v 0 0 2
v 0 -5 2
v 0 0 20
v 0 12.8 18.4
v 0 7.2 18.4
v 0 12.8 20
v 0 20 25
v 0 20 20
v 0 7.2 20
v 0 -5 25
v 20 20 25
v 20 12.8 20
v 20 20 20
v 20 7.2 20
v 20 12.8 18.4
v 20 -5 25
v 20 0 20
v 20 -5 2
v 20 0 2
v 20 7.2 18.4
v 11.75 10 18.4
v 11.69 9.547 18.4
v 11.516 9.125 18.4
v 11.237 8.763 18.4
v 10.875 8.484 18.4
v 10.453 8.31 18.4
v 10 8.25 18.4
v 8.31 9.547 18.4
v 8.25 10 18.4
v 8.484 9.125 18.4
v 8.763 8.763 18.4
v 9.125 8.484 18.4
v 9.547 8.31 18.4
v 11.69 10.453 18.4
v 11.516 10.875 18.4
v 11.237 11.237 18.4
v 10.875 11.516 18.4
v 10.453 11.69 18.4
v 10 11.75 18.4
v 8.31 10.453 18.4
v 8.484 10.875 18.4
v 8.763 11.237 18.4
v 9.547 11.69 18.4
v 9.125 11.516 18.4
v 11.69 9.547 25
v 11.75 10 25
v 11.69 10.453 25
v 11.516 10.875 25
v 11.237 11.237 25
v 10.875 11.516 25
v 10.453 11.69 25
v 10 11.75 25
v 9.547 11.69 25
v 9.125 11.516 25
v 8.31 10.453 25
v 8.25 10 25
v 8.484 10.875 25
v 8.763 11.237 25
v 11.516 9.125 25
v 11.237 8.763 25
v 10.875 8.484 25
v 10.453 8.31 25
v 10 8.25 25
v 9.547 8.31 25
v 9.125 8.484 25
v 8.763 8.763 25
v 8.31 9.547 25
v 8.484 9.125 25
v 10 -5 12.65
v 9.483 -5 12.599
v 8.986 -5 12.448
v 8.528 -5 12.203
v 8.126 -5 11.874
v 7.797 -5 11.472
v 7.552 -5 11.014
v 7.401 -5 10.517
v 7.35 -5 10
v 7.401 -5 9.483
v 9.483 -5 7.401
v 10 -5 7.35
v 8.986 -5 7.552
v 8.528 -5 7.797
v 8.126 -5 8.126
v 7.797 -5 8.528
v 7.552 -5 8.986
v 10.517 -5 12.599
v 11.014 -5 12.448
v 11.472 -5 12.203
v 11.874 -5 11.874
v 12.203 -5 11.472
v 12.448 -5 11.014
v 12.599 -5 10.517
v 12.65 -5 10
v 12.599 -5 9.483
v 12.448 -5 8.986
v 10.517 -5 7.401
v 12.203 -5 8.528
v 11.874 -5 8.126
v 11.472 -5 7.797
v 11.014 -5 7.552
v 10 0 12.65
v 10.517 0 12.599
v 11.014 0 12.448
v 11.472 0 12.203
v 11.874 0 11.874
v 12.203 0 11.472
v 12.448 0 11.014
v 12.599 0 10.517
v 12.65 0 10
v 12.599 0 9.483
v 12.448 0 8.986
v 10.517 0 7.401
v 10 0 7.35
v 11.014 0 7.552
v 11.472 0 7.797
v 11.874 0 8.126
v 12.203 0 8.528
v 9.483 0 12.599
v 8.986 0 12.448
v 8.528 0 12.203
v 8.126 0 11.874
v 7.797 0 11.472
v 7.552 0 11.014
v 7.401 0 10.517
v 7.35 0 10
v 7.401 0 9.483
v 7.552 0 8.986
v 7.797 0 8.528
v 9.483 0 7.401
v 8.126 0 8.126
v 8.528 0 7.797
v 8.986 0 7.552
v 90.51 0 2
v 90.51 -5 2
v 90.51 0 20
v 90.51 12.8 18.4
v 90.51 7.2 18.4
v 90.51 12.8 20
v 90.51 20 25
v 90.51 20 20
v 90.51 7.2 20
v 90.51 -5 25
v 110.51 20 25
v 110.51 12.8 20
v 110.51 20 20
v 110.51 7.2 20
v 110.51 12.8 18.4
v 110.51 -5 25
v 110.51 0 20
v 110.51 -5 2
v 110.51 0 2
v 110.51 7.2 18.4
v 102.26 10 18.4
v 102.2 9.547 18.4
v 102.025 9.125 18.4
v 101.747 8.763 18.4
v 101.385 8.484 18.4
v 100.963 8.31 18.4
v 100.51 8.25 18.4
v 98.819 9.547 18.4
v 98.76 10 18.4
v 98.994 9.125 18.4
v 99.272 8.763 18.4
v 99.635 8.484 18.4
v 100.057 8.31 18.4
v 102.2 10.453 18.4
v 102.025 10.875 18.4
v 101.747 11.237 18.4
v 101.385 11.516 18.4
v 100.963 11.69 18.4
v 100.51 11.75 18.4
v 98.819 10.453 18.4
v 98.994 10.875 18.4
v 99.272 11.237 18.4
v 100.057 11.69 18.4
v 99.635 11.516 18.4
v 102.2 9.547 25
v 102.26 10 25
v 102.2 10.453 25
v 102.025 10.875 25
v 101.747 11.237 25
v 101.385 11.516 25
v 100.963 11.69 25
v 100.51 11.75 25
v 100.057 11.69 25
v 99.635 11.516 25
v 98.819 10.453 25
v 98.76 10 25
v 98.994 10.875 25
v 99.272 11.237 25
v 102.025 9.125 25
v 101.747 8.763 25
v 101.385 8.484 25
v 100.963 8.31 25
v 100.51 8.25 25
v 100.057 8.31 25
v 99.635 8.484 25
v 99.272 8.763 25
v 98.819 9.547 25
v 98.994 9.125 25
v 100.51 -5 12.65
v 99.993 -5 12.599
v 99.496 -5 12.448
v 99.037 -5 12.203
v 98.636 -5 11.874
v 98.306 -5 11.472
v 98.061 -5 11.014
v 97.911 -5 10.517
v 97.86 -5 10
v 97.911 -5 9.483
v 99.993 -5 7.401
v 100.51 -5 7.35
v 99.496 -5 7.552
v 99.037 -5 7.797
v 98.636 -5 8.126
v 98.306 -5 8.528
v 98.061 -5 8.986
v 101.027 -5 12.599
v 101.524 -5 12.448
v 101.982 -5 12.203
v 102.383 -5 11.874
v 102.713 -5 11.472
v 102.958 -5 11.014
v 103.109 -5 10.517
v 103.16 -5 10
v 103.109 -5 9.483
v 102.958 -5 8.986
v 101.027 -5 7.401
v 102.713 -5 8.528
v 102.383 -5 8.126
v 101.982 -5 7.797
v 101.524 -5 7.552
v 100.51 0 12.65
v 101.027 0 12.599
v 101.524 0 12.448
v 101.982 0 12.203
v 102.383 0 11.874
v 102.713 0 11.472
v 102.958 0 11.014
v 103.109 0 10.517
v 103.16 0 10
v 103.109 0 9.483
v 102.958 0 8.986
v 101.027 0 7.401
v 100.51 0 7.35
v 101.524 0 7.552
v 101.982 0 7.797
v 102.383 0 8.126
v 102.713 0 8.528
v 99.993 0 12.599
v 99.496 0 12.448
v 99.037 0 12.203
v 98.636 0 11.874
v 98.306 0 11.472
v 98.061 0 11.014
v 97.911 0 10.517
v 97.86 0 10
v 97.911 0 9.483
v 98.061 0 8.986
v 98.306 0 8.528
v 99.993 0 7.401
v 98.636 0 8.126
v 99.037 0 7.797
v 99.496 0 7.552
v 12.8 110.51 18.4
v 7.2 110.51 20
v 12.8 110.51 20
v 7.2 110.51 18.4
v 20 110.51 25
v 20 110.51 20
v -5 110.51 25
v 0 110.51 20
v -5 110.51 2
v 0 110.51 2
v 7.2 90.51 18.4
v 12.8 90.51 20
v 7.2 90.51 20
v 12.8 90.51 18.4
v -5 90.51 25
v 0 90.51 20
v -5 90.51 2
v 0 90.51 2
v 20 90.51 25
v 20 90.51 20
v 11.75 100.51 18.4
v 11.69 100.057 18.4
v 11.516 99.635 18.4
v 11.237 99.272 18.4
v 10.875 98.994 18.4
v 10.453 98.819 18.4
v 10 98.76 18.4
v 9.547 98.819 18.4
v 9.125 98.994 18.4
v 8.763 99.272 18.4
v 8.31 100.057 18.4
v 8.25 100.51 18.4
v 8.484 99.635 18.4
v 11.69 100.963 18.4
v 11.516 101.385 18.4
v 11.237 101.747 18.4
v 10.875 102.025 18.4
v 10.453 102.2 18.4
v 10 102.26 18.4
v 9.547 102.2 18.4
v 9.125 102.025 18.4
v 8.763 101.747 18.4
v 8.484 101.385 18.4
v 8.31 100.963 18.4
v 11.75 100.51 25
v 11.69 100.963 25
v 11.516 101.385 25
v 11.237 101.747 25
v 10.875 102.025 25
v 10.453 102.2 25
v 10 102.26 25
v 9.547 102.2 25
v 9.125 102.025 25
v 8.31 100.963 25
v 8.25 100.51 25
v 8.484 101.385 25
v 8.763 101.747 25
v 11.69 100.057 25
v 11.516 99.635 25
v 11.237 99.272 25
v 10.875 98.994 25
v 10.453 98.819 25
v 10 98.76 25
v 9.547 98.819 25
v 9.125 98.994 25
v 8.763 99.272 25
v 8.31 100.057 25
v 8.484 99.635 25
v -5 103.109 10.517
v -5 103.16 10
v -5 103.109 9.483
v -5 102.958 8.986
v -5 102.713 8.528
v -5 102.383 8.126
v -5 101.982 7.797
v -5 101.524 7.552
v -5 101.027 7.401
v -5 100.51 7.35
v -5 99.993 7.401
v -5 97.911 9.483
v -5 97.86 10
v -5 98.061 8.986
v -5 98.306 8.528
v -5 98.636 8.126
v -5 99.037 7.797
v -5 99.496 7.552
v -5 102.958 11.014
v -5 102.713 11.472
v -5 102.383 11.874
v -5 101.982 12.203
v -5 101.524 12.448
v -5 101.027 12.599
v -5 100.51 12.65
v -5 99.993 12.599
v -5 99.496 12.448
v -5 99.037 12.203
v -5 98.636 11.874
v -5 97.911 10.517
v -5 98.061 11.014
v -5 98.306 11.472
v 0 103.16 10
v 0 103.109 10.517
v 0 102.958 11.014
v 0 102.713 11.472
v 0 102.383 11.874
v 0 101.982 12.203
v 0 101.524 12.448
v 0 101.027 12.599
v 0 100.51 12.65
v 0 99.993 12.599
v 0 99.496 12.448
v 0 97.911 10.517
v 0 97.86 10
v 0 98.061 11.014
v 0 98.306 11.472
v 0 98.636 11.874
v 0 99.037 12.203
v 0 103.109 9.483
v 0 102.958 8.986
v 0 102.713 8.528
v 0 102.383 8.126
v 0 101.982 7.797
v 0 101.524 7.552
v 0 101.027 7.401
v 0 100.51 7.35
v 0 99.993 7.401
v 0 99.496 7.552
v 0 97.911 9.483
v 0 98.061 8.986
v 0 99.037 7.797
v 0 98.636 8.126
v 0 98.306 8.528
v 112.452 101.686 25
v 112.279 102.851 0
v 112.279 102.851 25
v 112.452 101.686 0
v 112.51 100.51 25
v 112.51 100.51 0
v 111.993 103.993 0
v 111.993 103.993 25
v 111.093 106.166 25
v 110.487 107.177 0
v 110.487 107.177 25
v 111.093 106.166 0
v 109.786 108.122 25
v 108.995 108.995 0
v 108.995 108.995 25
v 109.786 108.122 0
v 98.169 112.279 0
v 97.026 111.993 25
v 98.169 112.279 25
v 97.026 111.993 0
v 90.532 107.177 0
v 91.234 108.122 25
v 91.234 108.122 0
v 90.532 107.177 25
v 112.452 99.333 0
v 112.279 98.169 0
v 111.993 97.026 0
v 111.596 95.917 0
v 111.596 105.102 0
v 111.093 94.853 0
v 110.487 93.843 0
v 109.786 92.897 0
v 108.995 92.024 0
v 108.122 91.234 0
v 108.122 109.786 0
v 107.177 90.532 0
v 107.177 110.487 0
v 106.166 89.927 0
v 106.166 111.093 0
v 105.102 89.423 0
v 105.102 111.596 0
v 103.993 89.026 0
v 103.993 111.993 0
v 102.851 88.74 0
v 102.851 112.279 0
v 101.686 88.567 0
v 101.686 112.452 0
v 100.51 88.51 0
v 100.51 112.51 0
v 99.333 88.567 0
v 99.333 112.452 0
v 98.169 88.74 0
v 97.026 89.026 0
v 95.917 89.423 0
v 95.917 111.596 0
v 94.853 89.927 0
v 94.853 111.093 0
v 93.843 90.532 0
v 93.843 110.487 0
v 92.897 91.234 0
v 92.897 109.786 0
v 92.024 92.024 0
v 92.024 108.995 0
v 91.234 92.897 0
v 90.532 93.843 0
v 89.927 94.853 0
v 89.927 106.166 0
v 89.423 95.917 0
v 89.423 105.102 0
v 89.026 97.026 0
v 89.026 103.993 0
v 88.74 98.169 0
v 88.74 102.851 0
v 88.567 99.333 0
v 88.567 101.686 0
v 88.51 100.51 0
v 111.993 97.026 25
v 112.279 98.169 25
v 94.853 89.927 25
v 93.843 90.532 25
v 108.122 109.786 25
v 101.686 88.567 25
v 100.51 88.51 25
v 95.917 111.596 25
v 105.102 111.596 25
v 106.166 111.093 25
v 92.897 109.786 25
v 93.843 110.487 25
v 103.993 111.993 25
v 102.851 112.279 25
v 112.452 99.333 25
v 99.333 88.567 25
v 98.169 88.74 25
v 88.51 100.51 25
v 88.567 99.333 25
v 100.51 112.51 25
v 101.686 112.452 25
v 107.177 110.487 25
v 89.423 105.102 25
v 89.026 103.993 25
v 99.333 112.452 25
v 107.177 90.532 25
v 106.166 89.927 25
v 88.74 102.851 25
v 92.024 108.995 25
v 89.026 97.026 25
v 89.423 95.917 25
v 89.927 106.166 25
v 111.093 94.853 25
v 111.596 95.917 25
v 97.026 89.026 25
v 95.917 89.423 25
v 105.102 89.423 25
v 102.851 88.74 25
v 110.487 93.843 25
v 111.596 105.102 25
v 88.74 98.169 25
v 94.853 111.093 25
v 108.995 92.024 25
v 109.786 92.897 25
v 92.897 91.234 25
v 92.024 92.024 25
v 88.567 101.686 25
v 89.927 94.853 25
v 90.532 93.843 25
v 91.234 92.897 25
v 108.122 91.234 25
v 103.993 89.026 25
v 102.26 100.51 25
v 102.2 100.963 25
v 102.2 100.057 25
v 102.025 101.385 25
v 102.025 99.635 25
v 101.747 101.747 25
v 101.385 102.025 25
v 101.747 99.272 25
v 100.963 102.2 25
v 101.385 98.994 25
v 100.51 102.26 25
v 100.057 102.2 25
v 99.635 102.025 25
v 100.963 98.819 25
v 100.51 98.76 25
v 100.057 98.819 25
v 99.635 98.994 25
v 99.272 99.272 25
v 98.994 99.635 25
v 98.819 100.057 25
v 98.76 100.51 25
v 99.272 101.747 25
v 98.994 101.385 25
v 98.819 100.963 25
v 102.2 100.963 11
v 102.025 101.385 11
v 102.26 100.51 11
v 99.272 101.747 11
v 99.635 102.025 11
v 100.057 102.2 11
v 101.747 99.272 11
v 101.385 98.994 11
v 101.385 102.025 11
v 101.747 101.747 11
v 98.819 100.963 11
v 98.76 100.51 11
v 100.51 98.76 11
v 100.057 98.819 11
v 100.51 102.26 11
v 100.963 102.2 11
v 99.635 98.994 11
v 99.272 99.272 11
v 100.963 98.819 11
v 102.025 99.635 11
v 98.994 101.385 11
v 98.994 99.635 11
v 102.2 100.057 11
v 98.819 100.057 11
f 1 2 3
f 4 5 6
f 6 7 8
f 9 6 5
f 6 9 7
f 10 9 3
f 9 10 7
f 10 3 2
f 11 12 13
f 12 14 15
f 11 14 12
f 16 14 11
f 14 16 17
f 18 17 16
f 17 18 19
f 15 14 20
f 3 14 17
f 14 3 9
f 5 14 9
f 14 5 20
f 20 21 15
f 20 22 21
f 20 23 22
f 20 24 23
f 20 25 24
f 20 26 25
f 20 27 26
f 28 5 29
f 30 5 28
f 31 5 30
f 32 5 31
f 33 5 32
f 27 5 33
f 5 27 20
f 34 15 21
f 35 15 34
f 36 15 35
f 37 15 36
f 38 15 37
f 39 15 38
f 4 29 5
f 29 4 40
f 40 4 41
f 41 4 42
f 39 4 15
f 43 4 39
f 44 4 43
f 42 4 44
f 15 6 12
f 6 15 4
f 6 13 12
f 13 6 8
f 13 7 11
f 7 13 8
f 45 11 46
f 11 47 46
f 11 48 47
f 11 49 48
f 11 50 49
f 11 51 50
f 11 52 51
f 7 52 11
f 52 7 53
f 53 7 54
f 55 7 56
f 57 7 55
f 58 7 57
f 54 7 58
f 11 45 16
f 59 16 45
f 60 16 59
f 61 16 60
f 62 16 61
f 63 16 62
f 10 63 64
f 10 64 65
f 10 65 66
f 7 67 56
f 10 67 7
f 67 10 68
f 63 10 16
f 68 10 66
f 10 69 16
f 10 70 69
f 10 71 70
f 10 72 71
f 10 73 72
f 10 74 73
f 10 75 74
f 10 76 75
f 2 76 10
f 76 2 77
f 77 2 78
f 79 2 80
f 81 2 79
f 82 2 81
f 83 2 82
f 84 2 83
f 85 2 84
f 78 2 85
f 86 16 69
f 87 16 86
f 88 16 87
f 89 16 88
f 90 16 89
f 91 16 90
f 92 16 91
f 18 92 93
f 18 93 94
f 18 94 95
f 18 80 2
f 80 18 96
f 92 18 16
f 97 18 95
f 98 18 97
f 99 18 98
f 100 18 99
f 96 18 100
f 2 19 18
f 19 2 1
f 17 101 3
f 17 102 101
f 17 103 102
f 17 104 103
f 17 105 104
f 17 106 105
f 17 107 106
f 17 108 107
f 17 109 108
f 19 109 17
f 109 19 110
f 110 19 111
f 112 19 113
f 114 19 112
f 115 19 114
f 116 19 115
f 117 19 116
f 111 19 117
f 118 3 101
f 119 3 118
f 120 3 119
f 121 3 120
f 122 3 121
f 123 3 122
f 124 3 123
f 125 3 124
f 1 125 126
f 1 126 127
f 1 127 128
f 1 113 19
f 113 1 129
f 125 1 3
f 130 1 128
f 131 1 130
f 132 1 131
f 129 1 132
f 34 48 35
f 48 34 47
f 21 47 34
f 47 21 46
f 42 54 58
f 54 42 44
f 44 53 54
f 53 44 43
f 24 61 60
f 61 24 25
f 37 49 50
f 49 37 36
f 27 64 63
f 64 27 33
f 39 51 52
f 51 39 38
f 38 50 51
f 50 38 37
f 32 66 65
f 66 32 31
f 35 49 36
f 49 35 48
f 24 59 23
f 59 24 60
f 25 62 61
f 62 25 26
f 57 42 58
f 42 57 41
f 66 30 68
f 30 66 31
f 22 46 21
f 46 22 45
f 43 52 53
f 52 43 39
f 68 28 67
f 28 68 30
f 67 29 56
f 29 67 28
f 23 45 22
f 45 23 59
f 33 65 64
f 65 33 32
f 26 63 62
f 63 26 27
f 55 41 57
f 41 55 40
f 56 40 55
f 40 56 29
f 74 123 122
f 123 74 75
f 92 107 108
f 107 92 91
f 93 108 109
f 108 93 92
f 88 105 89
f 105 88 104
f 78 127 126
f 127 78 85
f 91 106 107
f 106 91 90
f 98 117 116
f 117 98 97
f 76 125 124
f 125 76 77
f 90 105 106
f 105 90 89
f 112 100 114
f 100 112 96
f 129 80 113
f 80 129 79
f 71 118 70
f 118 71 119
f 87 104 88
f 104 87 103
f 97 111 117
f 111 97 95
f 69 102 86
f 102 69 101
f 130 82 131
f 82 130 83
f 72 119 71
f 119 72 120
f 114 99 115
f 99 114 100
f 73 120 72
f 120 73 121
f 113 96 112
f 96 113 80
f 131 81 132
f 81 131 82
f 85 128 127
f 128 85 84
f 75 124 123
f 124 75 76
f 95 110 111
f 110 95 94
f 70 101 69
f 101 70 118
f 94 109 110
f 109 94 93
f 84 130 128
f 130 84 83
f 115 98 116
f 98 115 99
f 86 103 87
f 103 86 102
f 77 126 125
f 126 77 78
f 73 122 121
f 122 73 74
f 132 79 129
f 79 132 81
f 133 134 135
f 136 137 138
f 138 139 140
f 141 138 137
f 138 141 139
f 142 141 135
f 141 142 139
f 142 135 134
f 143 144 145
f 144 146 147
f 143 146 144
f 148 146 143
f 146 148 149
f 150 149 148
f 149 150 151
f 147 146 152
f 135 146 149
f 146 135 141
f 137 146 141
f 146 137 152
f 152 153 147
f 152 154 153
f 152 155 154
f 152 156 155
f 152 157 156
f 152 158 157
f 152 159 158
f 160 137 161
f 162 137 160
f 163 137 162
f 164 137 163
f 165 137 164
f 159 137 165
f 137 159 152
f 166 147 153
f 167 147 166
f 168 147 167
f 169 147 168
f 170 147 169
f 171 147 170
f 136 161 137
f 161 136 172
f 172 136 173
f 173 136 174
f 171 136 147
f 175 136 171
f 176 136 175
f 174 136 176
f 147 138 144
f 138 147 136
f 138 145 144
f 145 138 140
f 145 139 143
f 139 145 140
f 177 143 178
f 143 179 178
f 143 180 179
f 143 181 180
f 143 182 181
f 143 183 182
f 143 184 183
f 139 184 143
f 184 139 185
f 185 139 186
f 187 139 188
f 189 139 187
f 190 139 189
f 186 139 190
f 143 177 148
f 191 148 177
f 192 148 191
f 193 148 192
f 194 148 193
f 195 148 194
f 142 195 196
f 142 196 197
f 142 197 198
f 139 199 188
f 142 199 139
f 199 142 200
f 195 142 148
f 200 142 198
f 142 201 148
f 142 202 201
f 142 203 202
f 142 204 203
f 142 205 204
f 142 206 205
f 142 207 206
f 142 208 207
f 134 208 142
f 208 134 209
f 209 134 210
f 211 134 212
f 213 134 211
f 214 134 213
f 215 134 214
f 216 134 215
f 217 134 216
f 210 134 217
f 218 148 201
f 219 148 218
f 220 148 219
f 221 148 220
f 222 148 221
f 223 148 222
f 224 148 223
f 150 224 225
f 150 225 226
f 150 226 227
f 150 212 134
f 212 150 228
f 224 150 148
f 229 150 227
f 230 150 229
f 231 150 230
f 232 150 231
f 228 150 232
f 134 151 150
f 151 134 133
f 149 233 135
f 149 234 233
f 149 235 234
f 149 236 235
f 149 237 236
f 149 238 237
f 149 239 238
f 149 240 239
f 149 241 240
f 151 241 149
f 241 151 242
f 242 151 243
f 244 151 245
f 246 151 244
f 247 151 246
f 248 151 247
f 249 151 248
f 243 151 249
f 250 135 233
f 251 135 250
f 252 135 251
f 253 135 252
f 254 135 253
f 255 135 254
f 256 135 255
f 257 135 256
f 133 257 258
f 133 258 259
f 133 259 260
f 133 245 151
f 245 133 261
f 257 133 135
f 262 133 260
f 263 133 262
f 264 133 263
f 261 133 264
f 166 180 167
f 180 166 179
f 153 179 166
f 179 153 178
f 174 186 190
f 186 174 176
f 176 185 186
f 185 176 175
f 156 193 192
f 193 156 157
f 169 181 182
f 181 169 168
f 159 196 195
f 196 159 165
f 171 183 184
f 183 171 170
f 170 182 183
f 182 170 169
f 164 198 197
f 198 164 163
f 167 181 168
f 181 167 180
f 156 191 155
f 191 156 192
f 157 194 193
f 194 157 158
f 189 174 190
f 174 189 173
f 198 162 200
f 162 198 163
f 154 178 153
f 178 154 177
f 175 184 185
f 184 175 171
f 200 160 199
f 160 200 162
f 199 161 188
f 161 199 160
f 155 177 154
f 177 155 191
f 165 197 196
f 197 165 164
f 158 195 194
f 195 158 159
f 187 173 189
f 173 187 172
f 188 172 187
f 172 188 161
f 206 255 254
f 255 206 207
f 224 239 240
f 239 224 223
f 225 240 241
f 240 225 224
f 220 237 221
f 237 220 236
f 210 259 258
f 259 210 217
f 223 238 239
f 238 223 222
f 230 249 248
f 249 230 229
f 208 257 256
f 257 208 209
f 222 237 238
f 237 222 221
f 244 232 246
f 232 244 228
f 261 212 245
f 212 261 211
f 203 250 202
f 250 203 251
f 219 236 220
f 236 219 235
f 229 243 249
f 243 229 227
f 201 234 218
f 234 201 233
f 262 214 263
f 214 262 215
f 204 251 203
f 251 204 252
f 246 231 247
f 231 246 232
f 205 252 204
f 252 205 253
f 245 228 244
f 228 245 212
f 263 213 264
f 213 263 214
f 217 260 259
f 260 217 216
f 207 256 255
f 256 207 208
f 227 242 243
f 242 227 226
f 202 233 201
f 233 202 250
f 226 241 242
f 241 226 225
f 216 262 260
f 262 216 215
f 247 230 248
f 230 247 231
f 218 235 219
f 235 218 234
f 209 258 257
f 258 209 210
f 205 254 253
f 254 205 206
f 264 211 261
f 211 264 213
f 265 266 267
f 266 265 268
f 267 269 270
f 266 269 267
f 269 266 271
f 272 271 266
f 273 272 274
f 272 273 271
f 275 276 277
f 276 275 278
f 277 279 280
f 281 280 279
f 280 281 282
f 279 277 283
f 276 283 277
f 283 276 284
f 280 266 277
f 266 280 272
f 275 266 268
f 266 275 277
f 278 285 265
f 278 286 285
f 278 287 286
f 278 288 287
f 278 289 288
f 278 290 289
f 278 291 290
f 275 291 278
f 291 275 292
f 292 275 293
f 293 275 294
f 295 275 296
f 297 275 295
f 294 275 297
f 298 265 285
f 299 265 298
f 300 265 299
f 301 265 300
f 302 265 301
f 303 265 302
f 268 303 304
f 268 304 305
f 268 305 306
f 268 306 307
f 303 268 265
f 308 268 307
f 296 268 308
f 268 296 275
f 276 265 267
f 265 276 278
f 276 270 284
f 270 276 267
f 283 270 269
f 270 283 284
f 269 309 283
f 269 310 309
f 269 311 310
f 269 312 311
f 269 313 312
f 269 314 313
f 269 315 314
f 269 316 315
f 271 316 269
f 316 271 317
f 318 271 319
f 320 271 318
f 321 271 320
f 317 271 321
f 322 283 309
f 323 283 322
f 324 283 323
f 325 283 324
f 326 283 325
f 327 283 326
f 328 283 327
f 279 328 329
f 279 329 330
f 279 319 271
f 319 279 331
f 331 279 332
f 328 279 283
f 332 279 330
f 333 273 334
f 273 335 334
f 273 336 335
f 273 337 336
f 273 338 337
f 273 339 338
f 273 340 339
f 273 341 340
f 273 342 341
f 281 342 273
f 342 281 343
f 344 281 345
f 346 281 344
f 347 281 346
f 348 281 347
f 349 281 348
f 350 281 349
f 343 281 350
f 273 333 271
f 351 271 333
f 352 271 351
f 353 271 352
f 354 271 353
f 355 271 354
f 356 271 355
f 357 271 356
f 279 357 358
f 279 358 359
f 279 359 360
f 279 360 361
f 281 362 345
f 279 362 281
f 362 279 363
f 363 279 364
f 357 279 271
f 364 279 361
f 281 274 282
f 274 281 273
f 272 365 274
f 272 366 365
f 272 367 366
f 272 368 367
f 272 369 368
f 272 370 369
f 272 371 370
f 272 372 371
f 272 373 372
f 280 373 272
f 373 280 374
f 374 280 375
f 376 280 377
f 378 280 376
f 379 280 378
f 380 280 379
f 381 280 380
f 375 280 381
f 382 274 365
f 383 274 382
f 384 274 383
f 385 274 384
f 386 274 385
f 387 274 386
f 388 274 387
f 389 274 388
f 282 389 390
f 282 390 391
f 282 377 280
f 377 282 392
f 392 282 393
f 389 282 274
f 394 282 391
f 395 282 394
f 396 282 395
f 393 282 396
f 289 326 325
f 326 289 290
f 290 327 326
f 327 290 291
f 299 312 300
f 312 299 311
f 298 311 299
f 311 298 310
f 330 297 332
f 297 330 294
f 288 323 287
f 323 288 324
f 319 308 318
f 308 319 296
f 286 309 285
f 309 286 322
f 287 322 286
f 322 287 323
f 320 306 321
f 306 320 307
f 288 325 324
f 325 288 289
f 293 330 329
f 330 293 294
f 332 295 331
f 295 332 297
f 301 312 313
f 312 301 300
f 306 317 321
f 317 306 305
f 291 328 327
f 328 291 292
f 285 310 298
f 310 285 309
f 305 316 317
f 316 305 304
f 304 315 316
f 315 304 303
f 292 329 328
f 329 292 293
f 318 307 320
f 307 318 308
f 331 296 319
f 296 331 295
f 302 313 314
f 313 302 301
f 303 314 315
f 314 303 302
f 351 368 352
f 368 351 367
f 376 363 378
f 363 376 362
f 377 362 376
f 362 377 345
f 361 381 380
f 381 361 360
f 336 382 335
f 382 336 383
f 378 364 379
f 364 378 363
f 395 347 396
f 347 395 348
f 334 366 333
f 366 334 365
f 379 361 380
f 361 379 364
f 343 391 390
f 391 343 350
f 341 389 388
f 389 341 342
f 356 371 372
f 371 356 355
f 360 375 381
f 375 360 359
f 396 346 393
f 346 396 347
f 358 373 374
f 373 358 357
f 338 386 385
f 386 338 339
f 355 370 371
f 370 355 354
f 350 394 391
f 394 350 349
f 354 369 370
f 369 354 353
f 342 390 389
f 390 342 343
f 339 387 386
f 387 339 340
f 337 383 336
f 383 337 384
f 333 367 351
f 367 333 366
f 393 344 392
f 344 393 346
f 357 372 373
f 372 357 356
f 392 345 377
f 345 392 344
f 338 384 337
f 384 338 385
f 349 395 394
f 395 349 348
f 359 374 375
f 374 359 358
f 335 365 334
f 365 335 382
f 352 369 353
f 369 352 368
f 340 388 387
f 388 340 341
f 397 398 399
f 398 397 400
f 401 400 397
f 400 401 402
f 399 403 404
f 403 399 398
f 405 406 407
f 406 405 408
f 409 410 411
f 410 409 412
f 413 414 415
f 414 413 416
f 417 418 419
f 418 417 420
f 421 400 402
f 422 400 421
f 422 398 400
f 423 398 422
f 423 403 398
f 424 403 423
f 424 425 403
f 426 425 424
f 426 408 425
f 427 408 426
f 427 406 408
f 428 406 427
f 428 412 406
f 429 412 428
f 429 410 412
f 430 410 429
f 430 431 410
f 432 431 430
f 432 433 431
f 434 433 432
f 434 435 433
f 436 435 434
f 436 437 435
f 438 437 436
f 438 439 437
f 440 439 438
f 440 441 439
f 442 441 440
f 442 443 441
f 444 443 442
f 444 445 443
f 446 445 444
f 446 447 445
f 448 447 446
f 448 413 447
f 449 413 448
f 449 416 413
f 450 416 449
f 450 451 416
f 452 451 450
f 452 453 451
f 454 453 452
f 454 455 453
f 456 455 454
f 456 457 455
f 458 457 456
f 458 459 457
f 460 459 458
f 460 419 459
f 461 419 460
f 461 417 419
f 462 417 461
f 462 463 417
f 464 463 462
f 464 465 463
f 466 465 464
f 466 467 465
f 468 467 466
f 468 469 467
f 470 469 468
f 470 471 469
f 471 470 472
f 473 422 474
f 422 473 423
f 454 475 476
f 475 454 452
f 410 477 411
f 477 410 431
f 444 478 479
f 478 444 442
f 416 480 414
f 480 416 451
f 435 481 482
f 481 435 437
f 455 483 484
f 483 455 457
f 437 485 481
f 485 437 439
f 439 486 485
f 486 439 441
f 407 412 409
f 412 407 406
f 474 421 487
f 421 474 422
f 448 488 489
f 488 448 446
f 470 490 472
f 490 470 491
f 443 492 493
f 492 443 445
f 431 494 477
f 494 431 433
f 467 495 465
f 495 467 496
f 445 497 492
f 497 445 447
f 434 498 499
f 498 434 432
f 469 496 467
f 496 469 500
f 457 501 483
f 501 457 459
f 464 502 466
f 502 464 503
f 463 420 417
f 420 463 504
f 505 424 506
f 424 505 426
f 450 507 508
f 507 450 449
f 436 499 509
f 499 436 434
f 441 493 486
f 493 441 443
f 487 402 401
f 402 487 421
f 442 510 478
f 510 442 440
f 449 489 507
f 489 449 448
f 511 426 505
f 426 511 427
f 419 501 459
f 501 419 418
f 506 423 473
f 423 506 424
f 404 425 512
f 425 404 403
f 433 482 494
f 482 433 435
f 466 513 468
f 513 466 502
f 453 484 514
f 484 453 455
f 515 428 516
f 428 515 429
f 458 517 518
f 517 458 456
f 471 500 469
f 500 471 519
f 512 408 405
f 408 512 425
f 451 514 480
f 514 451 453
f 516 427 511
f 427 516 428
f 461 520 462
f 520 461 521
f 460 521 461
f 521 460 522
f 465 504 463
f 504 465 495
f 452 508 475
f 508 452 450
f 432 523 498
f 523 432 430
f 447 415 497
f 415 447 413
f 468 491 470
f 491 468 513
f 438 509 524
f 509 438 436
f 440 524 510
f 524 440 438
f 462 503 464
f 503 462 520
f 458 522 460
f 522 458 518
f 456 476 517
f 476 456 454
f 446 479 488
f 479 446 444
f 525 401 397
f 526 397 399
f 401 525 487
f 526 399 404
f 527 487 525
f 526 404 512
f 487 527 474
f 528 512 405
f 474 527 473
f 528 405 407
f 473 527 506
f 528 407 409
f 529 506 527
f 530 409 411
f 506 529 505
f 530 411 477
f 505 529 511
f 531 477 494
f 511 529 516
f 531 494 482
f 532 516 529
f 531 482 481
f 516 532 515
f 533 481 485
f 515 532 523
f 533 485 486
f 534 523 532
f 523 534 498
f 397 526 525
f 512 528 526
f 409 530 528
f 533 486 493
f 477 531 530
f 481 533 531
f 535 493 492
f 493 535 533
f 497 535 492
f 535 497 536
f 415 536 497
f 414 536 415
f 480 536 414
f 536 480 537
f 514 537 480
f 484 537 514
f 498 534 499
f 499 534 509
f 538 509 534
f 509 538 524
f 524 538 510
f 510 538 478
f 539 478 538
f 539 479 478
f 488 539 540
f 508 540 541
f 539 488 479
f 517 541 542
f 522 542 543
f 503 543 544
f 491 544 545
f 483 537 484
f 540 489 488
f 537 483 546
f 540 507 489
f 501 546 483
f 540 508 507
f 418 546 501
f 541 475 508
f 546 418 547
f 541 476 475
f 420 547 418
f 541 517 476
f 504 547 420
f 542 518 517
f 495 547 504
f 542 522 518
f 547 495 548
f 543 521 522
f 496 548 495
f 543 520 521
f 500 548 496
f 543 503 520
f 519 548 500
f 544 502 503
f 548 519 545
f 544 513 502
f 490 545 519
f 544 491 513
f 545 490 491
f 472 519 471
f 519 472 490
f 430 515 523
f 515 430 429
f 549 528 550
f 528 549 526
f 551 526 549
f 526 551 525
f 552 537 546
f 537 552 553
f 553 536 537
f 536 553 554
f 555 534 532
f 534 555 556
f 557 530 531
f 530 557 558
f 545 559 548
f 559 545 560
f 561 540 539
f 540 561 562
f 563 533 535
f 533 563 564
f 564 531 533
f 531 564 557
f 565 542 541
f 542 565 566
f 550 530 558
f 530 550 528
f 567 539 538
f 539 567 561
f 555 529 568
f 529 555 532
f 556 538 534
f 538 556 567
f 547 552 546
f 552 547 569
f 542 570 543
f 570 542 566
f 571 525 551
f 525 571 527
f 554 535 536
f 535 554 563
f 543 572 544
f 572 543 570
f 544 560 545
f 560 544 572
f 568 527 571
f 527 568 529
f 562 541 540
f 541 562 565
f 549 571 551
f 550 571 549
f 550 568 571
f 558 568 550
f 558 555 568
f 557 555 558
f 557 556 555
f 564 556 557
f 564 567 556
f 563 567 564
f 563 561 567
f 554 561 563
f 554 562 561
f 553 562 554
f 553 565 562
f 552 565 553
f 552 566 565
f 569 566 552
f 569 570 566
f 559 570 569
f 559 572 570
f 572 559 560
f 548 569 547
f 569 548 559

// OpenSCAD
// V base: two 300 mm 2020 rails flat on the desk, joined at a right angle by
// Matt's 90 degree brackets, opening toward the work (Matt, 2026-09-20). It
// replaces the weighted base, which failed on the bench: 2 mm of printed
// plastic in bending, above the iron and below it (README iteration 43). The
// rule here is that everything between the bearing's outer race and the desk
// is stiff and in compression. The rails are the structure; what is printed
// is small and only ever squeezed or pulled.
//
// Matt's scheme: blocks like the camera mount, a T slider with a hole, slid
// along the rails' TOP slots until they sit under the outer race's holes, and
// the race's M4s go down into them.
//
// Where the bearing goes. The race's four holes are a 90.5 mm square (128
// PCD). On an L of two rails, three of them can lie on slot lines: two on
// one rail and one on the other, with the square's corner hole nearest the
// L's corner. That puts the spine 78 mm out from the corner along the
// diagonal, inside the V. The fourth hole, the one toward the work, is over
// bare desk, and it is the one that matters: tipping forward presses the
// front of the race DOWN. So it gets a FOOT, a printed pillar from the desk
// to the race, in plain compression. The three blocks then only hold the
// race down; the rear one sees about 28 N of pull at full reach.
//
// The blocks stand the race `spacer` above the rails. It cannot sit on them:
// the inner race turns, and the heads of the base's bolts hang under it.
//
// BLOCK: a 20 x 20 pad, `spacer` thick, on top of the rail, with the T
// under it in the slot. The T is load-stack.scad's slider section, numbers
// copied as frozen from what printed. Ø3.5 pilot right through for an M4 to
// tap: it takes 3.5 out of a 5.5 stem, but only over the hole's own length,
// and the stem is whole either side of it. Printed standing on the profile:
// no overhang, and the pull on the T runs in the layers, not across them.
//
// ANGLE (block_style = "angle", the default; Matt, 2026-09-21): the blocks
// are better as right angles on tee nuts, since they will not be moved. The
// same 20 x 20 pad on top of the rail, and a leg down the rail's OUTER side
// face with one M5 x 10 into a drop-in tee nut. So each bracket is fixed to
// its rail and nothing relies on a printed T under printed lips: the rear
// bracket's 28 N of lift goes pad, corner, leg, M5, nut. A low rib under the
// pad drops into the slot's opening, which squares the bracket to the rail
// and gives the M4 another 1.6 of plastic. It goes on from above, no sliding
// in from the rail's end. "slide" keeps the T block.
//
// FOOT: a round pillar, rail + spacer tall, with the same pilot. Printed as
// it stands.
part        = "layout";  // [layout, block, foot]
rail        = 20;
rail_len    = 300;
outer_pcd   = 128;       // proved on the 2026-09-13 fit gauge
bearing_od  = 140;
spacer      = 5;         // race above the rails: an M4 cap head under the inner race is 4
block_style = "angle";   // [angle, slide]
block_len   = 20;
leg_t       = 5;         // angle: leg down the rail's side
leg_short   = 2;         // angle: leg stops this far above the desk
m5_clear    = 5.3;
rib_w       = 5.6;       // angle: rib into the slot's 6.0 opening
rib_h       = 1.6;       // under a 1.8 lip
pilot       = 3.5;       // M4 self-tapping
foot_d      = 24;
foot_pilot_depth = 14;
// The slot. These rails are plain T-slot, not the V-slot the sliders were
// proved on (Matt, 2026-09-20). Generic T-slot 2020 varies most in its lips
// (1.5 to 2.3 thick) and its depth (5.35 on some), so this T is slacker than
// load-stack.scad's where slack costs nothing: lip_clr under the lips and
// floor_clr off the floor. The block is not clamped to its rail, it sits on
// it, and two blocks on one rail plus one on the other fix the race in plan;
// the slack under the lips is only how far the rear block lifts before it
// holds, 0.4 mm over 128.
slot_w      = 6.0;
lip_t       = 1.8;
chan_w      = 11;
chan_str    = 1.6;
chan_d      = 5.5;
stem_w      = slot_w - 0.5;
head_w      = chan_w - 0.6;
lip_clr     = 0.4;
floor_clr   = 0.5;
print_flip  = false;     // block only: standing on its profile
$fn = 64;

side     = outer_pcd/sqrt(2);                 // the hole square's side
knee_z   = lip_t + chan_str - 0.2;            // down into the slot
head_z   = chan_d - floor_clr;
head_bot = head_w - 2*(head_z - knee_z);
// Plan, rails' outer corner at the origin: rail A along +X (y 0..20), rail B
// along +Y (x 0..20), butted against A's side. Slot lines y = 10 and x = 10.
holes  = [[rail/2, rail/2], [rail/2 + side, rail/2], [rail/2, rail/2 + side], [rail/2 + side, rail/2 + side]];
centre = [rail/2 + side/2, rail/2 + side/2];
tipA   = [rail_len, rail/2];
tipB   = [rail/2, rail + rail_len];
// spine to the line between the rails' tips: the forward footprint
fwd    = abs((tipB[0]-tipA[0])*(tipA[1]-centre[1]) - (tipA[0]-centre[0])*(tipB[1]-tipA[1])) / norm(tipB - tipA);
echo(str("blocks on rail A at x = ", holes[0][0], " and ", holes[1][0], ", on rail B at y = ", holes[2][1],
         "; foot under the fourth hole at ", holes[3], "; spine ", norm(centre), " out from the corner"));
echo(str("blocks: ", block_style, block_style == "angle" ? str(", M4 taps ", spacer + rib_h, " of plastic, M5 x 10 leaves ", 10 - leg_t, " for the tee nut") : ""));
echo(str("forward footprint ", fwd, " mm: rig alone (2.6 kg) resists ", 2.6*9.81*fwd/1000, " N.m against about 2.1; race stands ",
         rail + spacer, " above the desk"));

module t_profile() {   // YZ, T hanging below z = 0
    polygon([[-rail/2, spacer], [rail/2, spacer], [rail/2, 0], [stem_w/2, 0], [stem_w/2, -lip_t - lip_clr],
             [head_w/2, -lip_t - lip_clr], [head_w/2, -knee_z], [head_bot/2, -head_z], [-head_bot/2, -head_z],
             [-head_w/2, -knee_z], [-head_w/2, -lip_t - lip_clr], [-stem_w/2, -lip_t - lip_clr], [-stem_w/2, 0], [-rail/2, 0]]);
}
// Angle bracket. Rail along X, top face at z = 0, outer side face at y = -rail/2.
module angle_profile() {   // YZ
    polygon([[-rail/2 - leg_t, spacer], [rail/2, spacer], [rail/2, 0], [rib_w/2, 0], [rib_w/2, -rib_h], [-rib_w/2, -rib_h],
             [-rib_w/2, 0], [-rail/2, 0], [-rail/2, -rail + leg_short], [-rail/2 - leg_t, -rail + leg_short]]);
}
module angle() {
    difference() {
        translate([-block_len/2, 0, 0]) rotate([90,0,90]) linear_extrude(block_len) angle_profile();
        translate([0, 0, -rib_h - 1]) cylinder(h=rib_h + spacer + 2, d=pilot, $fn=24);
        translate([0, -rail/2 + 1, -rail/2]) rotate([90,0,0]) cylinder(h=leg_t + 2, d=m5_clear, $fn=32);
    }
}
module block() { if(block_style == "angle") angle(); else slide_block(); }
// Slide block. Rail along X, its top face at z = 0.
module slide_block() {
    difference() {
        translate([-block_len/2, 0, 0]) rotate([90,0,90]) linear_extrude(block_len) t_profile();
        translate([0, 0, -head_z - 1]) cylinder(h=head_z + spacer + 2, d=pilot, $fn=24);
    }
}
module foot() {
    difference() {
        cylinder(h=rail + spacer, d=foot_d);
        translate([0, 0, rail + spacer - foot_pilot_depth]) cylinder(h=foot_pilot_depth + 1, d=pilot, $fn=24);
    }
}

if(part == "block") { if(print_flip) translate([0, 0, block_len/2]) rotate([0,-90,0]) block(); else block(); }
if(part == "foot")  foot();
if(part == "layout") {
    %color([0.66,0.71,0.75]) { cube([rail_len, rail, rail]); translate([0, rail, 0]) cube([rail, rail_len, rail]); }
    for(i=[0:1]) translate([holes[i][0], holes[i][1], rail]) block();
    translate([holes[2][0], holes[2][1], rail]) rotate([0,0,-90]) block();   // leg on rail B's outer face, x = 0
    translate([holes[3][0], holes[3][1], 0]) foot();
    %color([0.8,0.8,0.82]) translate([centre[0], centre[1], rail + spacer]) difference() {
        cylinder(h=8.5, d=bearing_od);
        translate([0,0,-1]) cylinder(h=11, d=113.6);
        for(h=holes) translate([h[0] - centre[0], h[1] - centre[1], -1]) cylinder(h=11, d=5, $fn=16);
    }
}
